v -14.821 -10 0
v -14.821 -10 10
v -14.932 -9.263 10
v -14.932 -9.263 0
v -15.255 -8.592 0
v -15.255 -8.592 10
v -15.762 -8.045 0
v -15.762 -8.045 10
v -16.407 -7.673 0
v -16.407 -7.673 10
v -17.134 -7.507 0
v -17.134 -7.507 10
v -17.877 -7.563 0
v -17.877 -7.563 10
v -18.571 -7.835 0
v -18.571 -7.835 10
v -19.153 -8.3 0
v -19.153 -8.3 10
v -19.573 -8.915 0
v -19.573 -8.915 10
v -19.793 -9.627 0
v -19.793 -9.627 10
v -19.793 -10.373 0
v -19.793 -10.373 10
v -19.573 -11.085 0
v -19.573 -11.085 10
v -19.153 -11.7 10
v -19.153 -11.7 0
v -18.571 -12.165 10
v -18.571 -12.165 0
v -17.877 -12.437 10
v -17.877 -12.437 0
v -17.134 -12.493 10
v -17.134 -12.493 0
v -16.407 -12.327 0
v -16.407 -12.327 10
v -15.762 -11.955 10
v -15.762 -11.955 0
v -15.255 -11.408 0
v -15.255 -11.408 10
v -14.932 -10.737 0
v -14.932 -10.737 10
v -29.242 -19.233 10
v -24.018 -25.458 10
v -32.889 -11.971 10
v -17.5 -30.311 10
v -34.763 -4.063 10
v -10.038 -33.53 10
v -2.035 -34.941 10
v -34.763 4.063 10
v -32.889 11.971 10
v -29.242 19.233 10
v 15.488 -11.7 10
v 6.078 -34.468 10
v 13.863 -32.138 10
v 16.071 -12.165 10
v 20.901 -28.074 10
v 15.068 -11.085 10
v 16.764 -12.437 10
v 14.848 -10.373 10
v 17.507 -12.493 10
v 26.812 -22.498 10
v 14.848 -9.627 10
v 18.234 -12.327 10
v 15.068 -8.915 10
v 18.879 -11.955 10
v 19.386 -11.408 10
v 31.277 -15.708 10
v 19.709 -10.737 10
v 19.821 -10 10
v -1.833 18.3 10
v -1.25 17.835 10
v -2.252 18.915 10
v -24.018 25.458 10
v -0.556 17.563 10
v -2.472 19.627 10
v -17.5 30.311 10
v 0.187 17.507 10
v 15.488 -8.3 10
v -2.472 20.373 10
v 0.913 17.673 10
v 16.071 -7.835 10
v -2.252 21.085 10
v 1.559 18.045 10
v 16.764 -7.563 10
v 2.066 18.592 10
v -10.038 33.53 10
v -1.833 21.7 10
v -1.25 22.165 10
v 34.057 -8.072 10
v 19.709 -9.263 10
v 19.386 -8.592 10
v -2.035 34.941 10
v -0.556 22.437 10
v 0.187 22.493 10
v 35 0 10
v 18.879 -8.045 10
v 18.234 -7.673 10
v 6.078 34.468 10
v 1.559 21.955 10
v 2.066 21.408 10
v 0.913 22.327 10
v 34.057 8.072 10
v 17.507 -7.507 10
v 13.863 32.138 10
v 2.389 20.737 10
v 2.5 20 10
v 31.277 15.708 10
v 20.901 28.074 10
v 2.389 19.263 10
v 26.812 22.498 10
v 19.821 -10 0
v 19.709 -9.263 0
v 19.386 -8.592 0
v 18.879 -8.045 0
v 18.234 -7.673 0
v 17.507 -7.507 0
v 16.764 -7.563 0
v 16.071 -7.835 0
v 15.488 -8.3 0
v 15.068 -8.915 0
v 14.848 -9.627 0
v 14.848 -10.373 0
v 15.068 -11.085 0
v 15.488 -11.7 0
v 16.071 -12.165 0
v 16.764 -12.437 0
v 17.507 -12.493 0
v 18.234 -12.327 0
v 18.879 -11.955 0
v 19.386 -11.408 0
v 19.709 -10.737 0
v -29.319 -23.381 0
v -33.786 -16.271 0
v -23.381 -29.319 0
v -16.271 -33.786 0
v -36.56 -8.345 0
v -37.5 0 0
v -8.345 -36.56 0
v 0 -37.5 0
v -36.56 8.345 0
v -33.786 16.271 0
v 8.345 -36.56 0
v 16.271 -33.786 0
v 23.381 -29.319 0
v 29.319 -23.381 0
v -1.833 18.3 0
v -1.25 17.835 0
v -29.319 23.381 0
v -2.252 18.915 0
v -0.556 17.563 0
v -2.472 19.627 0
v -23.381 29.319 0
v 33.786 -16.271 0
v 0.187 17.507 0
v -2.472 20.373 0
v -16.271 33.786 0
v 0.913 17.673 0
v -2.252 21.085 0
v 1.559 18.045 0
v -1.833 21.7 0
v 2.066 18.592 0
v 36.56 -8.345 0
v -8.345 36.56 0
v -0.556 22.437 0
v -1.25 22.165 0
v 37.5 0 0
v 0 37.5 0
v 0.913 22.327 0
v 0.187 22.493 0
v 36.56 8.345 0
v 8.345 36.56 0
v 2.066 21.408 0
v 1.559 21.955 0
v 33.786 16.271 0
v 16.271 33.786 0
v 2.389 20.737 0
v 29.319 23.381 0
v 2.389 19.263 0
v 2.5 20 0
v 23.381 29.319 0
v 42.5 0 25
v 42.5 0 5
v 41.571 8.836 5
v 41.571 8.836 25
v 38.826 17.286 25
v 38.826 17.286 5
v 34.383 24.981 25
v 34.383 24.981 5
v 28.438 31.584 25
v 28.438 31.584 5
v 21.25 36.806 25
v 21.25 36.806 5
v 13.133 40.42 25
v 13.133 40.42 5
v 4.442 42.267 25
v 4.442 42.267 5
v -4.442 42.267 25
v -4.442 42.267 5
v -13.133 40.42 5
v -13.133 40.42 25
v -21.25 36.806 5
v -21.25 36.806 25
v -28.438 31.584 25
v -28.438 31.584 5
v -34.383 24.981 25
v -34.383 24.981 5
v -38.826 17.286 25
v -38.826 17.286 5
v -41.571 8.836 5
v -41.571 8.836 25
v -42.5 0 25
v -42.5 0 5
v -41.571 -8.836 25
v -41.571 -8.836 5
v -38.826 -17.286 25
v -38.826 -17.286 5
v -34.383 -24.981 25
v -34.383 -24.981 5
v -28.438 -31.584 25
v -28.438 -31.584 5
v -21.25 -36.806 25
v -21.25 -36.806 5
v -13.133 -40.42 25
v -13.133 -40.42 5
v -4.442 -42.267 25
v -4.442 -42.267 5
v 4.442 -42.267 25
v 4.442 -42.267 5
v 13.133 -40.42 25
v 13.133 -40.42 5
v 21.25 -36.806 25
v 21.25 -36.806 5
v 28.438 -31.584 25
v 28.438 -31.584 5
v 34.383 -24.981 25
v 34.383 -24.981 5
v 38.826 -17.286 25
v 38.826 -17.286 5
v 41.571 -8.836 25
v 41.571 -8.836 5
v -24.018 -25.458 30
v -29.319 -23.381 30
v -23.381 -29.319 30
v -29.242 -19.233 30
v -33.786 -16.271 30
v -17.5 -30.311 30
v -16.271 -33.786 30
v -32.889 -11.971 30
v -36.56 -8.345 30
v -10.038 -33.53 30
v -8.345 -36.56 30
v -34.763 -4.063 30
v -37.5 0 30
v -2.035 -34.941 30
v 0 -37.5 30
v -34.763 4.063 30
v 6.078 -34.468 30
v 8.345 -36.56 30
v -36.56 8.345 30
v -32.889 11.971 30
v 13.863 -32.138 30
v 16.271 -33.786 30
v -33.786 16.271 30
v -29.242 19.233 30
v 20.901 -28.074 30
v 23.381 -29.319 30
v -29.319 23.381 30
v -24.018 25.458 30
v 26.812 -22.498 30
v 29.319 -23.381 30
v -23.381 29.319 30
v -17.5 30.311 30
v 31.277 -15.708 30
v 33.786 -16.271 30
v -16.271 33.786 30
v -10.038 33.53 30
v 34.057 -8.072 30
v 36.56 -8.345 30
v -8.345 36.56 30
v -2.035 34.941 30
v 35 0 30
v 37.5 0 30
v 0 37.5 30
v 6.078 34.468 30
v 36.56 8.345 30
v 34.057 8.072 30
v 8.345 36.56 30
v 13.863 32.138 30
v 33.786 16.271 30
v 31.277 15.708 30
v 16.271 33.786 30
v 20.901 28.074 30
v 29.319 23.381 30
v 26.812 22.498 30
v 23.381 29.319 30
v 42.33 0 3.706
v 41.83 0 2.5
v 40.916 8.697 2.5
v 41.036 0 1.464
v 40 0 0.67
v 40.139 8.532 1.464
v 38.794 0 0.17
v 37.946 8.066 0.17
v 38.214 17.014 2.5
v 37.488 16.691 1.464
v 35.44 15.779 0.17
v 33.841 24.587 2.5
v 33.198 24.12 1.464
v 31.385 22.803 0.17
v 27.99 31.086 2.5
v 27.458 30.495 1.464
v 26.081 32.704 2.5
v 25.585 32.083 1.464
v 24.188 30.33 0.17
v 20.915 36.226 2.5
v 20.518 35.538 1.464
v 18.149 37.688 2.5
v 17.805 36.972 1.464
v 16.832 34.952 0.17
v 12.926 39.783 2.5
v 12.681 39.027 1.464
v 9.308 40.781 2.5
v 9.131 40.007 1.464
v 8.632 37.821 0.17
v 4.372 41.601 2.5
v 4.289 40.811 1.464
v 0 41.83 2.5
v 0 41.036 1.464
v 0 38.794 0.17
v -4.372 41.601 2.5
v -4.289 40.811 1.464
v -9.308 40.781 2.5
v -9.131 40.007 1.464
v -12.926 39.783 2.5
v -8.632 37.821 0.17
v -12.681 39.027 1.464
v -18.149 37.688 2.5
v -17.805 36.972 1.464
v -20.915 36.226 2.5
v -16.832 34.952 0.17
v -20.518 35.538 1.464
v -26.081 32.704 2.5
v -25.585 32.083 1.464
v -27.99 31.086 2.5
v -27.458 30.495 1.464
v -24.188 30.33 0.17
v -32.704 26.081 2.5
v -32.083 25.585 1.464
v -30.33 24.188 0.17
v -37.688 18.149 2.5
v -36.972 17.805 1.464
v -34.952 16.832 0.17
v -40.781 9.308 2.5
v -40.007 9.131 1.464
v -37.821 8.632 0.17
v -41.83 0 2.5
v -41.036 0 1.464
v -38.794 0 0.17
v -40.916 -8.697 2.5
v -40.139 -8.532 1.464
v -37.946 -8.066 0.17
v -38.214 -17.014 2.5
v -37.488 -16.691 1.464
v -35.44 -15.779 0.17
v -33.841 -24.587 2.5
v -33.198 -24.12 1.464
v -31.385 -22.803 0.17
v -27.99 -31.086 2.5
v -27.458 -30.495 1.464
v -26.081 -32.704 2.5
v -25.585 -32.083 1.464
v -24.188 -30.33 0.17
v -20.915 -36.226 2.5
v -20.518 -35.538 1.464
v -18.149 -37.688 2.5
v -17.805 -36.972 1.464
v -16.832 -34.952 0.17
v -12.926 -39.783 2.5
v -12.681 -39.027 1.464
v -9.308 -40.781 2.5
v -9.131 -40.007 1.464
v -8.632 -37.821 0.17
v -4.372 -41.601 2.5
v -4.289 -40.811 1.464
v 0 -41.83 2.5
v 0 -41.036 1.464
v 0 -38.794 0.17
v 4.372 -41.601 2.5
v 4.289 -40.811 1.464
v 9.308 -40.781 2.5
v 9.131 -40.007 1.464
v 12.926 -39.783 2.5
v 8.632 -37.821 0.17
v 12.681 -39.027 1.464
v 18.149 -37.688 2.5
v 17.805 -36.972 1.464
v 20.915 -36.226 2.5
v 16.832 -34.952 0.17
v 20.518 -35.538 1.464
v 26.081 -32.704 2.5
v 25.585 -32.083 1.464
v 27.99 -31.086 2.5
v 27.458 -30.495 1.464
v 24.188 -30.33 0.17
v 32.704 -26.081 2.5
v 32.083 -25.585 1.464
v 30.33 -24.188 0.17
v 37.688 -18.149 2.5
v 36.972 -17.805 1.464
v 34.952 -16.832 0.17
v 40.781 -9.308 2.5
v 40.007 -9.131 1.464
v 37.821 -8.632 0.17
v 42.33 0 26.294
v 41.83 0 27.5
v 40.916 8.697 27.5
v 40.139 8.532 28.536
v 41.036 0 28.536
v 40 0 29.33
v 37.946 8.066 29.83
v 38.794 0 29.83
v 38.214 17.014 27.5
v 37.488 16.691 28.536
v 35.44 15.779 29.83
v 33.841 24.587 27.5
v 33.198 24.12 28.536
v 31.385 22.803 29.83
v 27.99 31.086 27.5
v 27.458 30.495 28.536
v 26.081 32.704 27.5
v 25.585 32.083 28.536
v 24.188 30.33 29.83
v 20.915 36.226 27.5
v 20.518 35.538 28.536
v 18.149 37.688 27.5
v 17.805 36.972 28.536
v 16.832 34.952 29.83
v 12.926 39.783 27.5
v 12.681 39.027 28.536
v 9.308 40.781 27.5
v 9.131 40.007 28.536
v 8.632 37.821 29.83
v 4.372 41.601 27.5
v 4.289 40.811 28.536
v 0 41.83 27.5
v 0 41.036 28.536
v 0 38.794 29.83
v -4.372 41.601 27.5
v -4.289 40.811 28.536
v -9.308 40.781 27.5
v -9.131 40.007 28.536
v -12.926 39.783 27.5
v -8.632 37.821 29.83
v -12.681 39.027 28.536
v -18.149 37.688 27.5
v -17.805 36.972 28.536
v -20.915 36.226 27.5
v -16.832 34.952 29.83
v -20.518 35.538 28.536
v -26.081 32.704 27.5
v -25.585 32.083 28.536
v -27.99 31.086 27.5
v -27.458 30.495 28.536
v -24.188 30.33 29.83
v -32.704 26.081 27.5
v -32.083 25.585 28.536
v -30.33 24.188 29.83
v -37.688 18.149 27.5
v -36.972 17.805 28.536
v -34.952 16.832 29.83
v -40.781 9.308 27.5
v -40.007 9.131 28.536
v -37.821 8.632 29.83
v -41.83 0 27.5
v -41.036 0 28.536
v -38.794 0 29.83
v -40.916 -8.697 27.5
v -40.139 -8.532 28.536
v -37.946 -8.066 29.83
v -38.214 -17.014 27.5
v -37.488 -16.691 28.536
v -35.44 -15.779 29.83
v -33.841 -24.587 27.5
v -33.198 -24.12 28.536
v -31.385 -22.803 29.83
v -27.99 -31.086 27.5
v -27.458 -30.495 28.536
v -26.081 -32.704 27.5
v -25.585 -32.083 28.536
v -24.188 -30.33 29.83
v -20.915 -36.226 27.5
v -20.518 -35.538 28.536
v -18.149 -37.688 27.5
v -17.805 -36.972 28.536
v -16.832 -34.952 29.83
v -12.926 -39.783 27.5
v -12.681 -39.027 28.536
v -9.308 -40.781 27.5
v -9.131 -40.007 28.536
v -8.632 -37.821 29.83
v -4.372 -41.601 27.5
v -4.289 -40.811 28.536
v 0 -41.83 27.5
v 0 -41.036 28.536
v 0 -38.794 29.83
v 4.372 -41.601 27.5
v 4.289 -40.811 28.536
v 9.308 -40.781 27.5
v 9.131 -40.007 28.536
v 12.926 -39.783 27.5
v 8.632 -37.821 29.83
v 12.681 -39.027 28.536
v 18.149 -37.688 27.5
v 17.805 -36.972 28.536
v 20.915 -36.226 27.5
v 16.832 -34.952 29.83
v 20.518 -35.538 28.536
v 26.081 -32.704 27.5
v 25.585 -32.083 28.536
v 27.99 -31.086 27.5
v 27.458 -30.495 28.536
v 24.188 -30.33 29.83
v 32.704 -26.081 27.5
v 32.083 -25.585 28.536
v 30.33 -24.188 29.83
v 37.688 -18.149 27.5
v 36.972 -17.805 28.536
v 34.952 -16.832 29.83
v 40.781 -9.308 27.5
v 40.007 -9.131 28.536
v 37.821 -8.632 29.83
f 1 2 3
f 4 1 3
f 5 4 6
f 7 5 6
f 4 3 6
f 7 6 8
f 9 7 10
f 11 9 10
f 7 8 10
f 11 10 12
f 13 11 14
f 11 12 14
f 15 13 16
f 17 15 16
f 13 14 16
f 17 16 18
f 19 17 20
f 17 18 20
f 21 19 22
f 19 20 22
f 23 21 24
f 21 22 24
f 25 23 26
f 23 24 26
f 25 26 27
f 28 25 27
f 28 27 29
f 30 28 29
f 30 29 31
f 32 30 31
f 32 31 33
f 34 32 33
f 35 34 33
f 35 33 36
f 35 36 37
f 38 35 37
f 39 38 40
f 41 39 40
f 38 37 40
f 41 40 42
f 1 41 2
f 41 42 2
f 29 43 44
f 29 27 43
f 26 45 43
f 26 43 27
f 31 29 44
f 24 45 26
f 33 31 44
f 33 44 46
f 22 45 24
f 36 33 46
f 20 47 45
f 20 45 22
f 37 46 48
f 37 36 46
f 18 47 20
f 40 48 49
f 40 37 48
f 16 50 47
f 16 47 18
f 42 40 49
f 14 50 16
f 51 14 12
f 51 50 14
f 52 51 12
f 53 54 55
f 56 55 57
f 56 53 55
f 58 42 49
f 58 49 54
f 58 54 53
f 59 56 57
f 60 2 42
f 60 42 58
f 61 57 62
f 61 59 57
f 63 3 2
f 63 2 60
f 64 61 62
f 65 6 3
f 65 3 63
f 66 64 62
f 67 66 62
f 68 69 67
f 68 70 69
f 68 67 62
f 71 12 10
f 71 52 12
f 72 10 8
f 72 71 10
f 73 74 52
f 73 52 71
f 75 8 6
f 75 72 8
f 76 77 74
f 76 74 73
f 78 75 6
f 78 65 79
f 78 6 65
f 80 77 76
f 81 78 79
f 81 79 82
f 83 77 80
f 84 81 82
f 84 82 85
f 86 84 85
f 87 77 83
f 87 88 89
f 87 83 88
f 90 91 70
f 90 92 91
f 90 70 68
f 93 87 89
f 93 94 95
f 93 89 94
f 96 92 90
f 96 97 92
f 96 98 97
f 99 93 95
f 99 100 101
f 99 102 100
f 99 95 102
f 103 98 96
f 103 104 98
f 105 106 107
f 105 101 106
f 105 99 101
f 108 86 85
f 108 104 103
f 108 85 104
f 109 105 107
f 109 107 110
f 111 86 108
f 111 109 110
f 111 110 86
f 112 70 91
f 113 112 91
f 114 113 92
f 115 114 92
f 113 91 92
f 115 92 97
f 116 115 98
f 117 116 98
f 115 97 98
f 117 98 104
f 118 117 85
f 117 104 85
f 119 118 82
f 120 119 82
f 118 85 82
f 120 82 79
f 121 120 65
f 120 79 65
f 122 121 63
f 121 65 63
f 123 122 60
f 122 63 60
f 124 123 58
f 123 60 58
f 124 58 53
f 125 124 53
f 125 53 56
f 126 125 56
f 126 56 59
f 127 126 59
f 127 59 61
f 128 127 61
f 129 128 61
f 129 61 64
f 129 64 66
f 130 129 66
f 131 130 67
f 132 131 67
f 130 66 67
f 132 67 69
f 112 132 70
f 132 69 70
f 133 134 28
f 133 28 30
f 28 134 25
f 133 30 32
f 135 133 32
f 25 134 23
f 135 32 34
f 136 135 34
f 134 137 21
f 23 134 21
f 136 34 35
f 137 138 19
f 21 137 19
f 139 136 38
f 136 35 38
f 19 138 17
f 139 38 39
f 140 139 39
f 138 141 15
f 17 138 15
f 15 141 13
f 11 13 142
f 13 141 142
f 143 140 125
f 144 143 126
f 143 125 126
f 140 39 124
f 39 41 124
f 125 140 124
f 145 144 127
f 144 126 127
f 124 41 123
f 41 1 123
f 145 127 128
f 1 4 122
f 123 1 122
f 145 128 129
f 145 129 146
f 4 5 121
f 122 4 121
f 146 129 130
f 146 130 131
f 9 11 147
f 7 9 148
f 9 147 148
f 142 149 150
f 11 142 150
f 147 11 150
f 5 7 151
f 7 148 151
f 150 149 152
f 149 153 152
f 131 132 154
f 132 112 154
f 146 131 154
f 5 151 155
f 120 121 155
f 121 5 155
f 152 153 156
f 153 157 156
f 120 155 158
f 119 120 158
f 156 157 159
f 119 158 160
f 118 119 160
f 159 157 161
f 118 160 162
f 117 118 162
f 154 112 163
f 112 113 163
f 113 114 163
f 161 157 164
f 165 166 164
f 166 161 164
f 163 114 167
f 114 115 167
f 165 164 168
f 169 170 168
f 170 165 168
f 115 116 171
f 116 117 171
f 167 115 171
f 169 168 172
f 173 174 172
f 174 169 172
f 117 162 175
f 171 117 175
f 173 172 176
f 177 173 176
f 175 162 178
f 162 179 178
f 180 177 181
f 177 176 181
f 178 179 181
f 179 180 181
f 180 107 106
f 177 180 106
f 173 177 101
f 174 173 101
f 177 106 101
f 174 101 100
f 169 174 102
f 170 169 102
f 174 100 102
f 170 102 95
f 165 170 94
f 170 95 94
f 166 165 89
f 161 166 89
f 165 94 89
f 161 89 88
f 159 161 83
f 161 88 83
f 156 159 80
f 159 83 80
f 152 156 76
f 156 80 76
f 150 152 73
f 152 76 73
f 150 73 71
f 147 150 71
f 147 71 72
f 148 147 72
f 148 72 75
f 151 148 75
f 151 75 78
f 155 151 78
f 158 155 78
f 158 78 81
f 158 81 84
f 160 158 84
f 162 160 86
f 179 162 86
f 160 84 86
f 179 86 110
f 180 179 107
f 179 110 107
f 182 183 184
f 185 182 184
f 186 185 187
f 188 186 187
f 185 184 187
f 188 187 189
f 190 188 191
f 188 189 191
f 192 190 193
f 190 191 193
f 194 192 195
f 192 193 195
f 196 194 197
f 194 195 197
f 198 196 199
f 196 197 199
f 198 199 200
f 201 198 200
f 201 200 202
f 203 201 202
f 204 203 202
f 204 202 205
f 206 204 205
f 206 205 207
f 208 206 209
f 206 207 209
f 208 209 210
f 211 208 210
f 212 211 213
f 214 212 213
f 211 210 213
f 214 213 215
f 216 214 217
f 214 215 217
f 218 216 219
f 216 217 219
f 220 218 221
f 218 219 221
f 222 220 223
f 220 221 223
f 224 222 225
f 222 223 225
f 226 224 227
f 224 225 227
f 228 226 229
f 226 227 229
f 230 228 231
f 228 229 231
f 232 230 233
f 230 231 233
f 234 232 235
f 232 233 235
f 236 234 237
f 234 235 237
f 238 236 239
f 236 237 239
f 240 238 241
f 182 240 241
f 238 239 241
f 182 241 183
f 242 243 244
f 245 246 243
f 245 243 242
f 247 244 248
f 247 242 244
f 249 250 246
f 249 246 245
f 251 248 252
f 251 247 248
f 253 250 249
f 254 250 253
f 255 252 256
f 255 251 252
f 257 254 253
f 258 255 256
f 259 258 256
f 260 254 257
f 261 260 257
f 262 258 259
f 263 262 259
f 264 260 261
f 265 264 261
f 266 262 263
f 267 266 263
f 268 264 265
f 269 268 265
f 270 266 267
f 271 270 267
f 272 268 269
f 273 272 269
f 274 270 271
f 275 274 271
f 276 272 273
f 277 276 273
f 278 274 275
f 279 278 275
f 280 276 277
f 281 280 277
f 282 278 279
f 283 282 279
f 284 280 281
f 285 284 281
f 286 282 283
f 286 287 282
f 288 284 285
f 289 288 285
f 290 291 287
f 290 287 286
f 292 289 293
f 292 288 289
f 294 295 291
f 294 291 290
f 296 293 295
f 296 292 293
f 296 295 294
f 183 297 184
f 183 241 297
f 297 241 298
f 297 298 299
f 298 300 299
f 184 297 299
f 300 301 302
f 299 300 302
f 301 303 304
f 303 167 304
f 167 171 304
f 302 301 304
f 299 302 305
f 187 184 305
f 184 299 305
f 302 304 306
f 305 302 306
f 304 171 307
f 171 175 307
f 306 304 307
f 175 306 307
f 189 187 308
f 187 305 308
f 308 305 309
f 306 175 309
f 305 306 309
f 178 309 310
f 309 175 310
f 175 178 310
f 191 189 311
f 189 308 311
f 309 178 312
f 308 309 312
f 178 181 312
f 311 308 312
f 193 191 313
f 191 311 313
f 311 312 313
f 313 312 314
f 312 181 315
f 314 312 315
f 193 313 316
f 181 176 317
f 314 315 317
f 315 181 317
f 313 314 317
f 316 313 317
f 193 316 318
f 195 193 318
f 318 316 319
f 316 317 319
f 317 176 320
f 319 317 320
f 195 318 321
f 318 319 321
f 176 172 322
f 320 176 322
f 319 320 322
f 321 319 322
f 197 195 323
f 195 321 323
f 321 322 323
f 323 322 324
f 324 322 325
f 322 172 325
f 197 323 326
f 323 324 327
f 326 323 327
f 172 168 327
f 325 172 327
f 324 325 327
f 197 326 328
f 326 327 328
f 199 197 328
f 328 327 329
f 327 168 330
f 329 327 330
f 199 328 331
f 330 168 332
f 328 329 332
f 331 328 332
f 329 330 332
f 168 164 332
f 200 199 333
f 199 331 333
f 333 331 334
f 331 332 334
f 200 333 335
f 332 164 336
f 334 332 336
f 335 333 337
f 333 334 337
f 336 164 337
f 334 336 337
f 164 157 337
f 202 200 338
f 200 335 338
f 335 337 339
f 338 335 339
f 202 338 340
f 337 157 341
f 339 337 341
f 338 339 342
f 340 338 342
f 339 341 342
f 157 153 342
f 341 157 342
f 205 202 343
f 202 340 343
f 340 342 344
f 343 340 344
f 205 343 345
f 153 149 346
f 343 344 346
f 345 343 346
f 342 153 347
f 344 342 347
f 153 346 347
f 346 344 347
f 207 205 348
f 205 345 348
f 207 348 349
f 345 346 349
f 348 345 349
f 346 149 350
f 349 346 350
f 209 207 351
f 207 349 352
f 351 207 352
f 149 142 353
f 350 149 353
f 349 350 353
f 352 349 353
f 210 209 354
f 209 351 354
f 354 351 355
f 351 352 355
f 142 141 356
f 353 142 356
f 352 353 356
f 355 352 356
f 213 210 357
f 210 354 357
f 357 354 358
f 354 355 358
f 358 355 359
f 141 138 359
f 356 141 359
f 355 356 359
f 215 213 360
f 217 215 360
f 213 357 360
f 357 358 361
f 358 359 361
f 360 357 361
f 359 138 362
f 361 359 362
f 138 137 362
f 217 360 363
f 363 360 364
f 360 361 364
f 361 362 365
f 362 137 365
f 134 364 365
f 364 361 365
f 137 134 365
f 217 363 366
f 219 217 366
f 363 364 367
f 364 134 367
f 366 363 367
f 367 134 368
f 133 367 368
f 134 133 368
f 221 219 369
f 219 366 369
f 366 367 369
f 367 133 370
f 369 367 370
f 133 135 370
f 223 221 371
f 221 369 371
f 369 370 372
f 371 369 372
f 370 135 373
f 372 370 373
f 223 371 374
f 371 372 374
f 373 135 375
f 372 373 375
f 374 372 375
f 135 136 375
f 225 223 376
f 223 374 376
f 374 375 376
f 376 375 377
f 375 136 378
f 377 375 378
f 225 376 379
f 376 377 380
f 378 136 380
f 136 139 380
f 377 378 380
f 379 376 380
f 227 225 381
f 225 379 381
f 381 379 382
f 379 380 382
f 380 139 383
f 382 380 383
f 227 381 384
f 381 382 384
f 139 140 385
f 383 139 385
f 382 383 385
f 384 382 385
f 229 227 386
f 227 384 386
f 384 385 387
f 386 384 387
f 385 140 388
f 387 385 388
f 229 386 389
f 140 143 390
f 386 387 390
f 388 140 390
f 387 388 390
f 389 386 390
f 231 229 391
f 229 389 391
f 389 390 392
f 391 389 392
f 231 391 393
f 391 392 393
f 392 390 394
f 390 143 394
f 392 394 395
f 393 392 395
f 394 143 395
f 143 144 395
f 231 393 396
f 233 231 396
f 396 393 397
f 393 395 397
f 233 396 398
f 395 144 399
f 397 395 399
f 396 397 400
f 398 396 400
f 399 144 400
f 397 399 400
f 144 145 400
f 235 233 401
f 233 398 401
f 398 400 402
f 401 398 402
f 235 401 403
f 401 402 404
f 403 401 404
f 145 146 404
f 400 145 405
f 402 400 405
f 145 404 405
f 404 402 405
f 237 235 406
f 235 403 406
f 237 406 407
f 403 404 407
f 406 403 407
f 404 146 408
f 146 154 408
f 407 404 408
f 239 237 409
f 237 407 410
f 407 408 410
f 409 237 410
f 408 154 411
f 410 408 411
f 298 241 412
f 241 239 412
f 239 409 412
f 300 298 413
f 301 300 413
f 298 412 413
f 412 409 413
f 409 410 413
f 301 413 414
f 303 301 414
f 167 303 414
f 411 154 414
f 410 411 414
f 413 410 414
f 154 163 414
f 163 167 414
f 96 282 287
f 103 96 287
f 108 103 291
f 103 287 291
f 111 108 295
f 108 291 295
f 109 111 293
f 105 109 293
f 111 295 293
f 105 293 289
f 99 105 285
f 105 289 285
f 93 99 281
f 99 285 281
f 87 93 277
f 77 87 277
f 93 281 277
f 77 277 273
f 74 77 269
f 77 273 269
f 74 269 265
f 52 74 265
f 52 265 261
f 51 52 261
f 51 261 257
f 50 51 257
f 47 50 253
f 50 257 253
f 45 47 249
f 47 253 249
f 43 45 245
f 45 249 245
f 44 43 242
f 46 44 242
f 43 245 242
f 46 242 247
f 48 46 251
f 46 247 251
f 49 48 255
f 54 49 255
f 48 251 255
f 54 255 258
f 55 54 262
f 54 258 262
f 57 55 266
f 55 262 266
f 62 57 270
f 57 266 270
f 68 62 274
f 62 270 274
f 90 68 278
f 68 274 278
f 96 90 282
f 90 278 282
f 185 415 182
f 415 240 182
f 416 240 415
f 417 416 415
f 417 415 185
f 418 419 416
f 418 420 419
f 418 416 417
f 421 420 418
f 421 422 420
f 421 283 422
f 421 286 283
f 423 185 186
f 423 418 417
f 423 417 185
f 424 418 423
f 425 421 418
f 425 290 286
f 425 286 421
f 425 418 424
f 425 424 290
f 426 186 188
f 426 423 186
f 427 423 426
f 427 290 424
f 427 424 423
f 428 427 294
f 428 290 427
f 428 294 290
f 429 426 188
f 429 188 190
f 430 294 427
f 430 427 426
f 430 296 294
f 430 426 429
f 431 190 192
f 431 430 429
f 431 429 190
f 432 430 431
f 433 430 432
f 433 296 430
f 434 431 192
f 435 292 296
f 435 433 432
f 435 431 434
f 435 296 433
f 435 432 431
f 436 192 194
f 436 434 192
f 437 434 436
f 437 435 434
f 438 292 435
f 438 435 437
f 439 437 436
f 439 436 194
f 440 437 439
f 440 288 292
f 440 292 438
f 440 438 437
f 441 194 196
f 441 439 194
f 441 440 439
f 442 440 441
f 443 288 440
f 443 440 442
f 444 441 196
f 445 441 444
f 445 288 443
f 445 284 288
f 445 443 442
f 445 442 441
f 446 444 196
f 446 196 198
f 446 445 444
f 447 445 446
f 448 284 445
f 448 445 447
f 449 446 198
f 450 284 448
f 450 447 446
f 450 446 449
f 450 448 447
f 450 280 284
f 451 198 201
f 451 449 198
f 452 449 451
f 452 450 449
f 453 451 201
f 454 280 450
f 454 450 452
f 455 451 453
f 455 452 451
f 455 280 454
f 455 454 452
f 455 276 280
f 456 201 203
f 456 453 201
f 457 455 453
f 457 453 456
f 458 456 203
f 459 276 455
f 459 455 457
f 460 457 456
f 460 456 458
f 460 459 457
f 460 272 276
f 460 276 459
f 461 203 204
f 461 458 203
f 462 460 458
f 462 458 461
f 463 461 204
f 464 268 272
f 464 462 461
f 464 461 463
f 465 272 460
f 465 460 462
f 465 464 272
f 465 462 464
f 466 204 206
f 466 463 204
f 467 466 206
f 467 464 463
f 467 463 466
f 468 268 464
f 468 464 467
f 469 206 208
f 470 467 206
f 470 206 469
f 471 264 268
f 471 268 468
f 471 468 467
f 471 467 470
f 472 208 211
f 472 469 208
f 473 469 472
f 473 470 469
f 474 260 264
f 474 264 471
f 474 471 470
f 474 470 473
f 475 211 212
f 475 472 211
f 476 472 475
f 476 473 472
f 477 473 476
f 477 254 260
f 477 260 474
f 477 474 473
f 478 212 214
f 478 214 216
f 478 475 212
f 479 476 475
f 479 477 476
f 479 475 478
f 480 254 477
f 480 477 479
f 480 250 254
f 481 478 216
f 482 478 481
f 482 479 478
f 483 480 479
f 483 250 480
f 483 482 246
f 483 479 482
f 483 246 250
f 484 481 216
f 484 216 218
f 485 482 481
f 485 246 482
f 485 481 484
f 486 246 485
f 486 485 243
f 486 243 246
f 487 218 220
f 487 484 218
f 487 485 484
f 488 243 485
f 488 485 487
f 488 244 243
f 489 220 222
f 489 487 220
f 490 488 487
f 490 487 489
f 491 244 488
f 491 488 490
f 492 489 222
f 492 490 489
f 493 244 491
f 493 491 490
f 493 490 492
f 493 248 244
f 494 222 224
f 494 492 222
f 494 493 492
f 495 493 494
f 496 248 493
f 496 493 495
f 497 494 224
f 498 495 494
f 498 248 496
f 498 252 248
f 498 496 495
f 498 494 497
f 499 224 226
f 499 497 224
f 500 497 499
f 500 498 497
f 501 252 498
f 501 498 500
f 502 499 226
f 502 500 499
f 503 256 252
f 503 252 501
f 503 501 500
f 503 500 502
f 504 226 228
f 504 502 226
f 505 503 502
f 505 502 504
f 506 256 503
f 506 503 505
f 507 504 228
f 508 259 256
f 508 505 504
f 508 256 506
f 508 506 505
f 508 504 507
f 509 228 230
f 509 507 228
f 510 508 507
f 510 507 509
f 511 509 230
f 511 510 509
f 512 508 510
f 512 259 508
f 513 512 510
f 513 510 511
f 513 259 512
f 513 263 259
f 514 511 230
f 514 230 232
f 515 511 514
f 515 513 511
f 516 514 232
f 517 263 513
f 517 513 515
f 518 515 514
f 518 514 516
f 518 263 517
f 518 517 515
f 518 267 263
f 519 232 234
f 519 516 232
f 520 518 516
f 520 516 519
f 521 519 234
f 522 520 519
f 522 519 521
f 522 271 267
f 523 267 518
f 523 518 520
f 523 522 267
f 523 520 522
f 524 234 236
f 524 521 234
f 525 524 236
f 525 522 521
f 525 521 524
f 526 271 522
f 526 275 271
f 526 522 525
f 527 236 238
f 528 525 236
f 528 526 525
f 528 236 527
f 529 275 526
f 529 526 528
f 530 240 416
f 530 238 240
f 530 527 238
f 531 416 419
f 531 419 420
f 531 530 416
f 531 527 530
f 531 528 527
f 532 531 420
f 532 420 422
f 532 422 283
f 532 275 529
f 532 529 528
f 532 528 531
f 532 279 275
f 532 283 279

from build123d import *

# Parameters (mm, degrees)
SKETCH2_R           = 42.5
BOSS_EXTRUDE2_DEPTH = 30
SKETCH3_OUTSIDE_W   = 111.78
SKETCH3_OUTSIDE_H   = 111.78
SKETCH3_OUTSIDE_R   = 42.5
SKETCH3_OUTSIDE_R_2 = 35
CUT_EXTRUDE2_DEPTH  = 20
SKETCH8_R           = 2.5
CUT_EXTRUDE3_DEPTH  = 10
FILLET3_R           = 5


with BuildPart() as part:
    # Sketch2 → Boss-Extrude2 (new body)
    with BuildSketch(Plane.XY):
        Circle(SKETCH2_R)
    extrude(amount=BOSS_EXTRUDE2_DEPTH)

    # Sketch3 outside → Cut-Extrude2 (cut)
    # profile 1 of 2: a face of its own
    with BuildSketch(Plane.XY.offset(30)):
        Rectangle(SKETCH3_OUTSIDE_W, SKETCH3_OUTSIDE_H)
        Circle(SKETCH3_OUTSIDE_R, mode=Mode.SUBTRACT)
    # profile 2 of 2: a face of its own
    with BuildSketch(Plane.XY.offset(30)):
        Circle(SKETCH3_OUTSIDE_R_2)
    extrude(amount=-CUT_EXTRUDE2_DEPTH, mode=Mode.SUBTRACT)

    # Sketch8 → Cut-Extrude3 (cut)
    with BuildSketch(Plane.XY.offset(10)):
        with Locations((0, 20)):
            Circle(SKETCH8_R)
        with Locations((17.320508076, -10)):
            Circle(SKETCH8_R)
        with Locations((-17.320508076, -10)):
            Circle(SKETCH8_R)
    extrude(amount=-CUT_EXTRUDE3_DEPTH, mode=Mode.SUBTRACT)

    # Fillet3
    fillet3_edges = [part.edges().sort_by_distance(p)[0] for p in [
        (-42.5, 0, 0),
        (-42.5, 0, 30),
    ]]
    fillet(fillet3_edges, radius=FILLET3_R)


solid = part.part
